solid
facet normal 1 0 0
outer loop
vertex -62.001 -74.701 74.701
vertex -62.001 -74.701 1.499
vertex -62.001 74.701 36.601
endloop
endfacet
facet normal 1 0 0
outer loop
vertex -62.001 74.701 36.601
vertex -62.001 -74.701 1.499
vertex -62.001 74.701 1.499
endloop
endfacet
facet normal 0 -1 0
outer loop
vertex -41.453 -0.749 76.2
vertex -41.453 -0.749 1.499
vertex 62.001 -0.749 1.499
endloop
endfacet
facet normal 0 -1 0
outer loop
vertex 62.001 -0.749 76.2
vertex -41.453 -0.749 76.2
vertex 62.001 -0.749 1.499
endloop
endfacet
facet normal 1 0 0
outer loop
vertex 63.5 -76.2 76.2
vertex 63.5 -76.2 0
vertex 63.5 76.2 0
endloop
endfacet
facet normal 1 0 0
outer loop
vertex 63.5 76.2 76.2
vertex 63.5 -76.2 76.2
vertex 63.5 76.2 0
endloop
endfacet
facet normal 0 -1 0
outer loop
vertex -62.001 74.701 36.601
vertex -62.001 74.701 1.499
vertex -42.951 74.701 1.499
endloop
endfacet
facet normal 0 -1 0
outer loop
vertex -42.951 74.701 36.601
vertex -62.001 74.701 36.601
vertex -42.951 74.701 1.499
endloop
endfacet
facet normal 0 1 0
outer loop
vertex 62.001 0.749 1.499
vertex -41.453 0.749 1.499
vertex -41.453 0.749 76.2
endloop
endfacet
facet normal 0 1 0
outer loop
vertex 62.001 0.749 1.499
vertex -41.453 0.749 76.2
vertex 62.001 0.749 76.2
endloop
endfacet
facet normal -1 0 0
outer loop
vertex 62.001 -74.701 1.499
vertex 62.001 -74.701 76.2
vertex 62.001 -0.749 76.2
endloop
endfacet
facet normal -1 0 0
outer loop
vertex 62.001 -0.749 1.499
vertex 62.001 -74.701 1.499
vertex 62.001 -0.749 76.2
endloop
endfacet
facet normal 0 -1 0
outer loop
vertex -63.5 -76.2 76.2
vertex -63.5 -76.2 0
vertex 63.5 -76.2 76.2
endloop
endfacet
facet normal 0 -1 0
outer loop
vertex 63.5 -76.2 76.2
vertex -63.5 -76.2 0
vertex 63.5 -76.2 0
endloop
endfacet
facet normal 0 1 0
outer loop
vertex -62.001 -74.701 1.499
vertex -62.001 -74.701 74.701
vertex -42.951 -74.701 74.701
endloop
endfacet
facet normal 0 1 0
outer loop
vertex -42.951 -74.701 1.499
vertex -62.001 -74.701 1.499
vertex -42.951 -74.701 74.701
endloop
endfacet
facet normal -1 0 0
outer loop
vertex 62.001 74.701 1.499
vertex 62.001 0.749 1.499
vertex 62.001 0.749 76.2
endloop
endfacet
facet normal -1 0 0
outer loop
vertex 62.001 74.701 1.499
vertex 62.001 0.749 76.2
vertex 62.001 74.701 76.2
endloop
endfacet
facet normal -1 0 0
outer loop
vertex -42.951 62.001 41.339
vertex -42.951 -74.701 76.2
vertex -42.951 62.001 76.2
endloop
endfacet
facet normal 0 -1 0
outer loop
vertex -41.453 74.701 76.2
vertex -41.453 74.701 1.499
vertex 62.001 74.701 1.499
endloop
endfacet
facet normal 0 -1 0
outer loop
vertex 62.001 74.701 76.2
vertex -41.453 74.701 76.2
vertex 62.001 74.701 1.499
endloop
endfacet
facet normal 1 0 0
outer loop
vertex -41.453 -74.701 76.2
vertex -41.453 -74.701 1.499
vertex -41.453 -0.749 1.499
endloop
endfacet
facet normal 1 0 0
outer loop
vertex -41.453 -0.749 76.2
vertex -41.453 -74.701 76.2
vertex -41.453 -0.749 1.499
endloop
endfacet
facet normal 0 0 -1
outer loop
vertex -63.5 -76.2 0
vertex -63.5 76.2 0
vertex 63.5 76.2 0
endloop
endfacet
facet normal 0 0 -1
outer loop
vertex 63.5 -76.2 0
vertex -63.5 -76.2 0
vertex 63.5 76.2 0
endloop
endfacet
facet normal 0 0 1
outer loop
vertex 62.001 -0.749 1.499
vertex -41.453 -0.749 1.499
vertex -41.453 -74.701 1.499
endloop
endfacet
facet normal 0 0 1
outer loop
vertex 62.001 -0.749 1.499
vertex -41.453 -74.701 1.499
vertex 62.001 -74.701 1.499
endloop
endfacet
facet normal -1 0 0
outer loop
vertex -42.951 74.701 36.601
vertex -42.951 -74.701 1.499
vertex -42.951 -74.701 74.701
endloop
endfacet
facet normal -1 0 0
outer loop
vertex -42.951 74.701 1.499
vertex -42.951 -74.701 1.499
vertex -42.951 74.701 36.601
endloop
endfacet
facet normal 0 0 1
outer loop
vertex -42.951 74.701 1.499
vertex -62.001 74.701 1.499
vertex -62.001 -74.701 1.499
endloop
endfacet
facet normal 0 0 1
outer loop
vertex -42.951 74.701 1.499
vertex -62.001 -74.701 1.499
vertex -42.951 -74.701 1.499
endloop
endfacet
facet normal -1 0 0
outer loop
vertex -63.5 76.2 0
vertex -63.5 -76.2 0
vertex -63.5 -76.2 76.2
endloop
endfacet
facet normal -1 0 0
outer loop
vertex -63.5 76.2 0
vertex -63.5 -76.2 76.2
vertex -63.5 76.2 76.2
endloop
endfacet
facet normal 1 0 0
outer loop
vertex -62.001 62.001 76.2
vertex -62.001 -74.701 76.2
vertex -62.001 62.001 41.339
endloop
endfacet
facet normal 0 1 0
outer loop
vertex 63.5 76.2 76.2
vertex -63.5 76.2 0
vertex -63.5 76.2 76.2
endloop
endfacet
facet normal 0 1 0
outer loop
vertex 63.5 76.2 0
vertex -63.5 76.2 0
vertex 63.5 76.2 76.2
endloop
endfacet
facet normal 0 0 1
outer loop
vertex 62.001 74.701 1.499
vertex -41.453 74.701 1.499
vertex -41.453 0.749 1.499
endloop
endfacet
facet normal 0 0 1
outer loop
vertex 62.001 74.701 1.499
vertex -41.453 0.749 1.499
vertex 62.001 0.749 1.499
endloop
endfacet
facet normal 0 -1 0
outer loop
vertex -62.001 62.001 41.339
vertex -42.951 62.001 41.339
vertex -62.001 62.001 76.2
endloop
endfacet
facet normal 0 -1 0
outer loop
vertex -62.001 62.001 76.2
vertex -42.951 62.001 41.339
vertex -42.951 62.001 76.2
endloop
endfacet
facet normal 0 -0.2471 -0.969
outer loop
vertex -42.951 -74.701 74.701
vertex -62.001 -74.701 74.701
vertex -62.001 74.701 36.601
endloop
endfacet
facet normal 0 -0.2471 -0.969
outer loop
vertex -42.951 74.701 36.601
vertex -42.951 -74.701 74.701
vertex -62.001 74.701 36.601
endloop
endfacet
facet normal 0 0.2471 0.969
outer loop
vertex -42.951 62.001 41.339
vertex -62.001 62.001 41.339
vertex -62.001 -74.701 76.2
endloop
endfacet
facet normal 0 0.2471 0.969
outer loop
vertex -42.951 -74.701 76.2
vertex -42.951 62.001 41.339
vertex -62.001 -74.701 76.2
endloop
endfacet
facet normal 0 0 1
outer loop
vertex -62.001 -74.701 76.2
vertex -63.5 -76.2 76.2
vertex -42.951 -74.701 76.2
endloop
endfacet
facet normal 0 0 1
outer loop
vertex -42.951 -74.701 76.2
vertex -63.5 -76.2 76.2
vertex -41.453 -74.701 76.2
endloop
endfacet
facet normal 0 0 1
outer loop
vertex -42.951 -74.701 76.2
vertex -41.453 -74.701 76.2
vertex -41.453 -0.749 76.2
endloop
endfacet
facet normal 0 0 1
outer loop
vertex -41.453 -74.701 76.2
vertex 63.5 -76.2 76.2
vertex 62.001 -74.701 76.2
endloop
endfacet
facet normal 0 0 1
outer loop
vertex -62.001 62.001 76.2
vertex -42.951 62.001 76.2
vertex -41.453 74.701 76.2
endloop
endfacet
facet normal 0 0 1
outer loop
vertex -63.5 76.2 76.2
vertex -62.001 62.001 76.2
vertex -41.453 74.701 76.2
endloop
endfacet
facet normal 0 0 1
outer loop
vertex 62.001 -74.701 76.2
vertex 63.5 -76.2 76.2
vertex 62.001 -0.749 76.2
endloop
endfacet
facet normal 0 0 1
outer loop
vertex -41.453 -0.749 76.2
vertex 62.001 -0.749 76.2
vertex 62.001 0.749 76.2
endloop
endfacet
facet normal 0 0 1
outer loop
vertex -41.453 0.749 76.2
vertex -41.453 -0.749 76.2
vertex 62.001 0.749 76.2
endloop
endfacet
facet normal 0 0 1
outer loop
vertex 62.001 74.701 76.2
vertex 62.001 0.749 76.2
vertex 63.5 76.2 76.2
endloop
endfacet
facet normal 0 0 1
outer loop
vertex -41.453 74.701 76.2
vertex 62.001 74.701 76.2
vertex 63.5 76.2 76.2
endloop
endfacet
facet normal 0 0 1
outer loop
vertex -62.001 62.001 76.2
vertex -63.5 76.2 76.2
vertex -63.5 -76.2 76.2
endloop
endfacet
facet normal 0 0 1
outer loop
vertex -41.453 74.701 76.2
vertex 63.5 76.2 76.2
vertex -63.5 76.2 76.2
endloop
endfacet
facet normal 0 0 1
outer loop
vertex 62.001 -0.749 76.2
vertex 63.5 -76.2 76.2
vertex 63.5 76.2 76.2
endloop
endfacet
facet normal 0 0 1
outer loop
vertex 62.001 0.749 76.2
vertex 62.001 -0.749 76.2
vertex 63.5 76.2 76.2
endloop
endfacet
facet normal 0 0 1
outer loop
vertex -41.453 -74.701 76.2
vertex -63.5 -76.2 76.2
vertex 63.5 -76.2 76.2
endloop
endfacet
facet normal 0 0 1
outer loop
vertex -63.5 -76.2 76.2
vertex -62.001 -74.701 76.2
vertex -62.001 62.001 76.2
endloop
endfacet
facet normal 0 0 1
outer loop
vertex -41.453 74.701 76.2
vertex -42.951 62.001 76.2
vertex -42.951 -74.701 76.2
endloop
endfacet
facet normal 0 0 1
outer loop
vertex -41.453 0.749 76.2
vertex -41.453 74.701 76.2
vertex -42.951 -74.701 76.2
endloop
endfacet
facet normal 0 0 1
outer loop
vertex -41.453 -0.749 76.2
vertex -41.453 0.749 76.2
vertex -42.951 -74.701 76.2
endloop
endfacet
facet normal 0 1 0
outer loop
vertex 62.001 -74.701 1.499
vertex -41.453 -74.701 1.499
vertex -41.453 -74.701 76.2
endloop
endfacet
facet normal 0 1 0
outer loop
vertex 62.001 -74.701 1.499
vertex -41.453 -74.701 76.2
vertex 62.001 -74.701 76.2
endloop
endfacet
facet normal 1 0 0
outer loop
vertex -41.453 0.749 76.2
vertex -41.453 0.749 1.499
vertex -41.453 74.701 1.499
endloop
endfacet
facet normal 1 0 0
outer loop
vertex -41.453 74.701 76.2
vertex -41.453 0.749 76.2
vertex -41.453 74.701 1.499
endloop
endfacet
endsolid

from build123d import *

# Parameters (mm, degrees)
F0_W      = 127
F0_H      = 152.4
F1_DEPTH  = 76.2
F2_T      = -1.4986
F3_W      = 1.4986
F3_H      = 149.4028
F5_DEPTH  = 74.7014
F6_DEPTH  = 19.05
F8_DEPTH  = 19.05
F9_W      = 103.4542
F9_H      = 1.4986
F10_DEPTH = 74.7014


# Not quite as in the source:
# - an extrude ends at something that could not be found from the text; its depth is read off the source's solid


with BuildPart() as f1:
    # F0 (on Top) → F1 (new body)
    with BuildSketch(Plane.XY):
        Rectangle(F0_W, F0_H)
    extrude(amount=F1_DEPTH)

    # F2
    f2_openings = [f1.faces().sort_by_distance(p)[0] for p in [
        (0, 0, 76.2),
    ]]
    offset(amount=F2_T, openings=f2_openings)

    # F3 (on face) → F5 (join, through all)
    with BuildSketch(Plane.XY.offset(1.4986)):
        with Locations((-42.2021, 0)):
            Rectangle(F3_W, F3_H)
    extrude(amount=F5_DEPTH)

    # F4 (on face) → F6 (join, through all)
    with BuildSketch(Plane.YZ.offset(-62.0014)):
        Polygon((-74.7014, 74.7014), (74.7014, 36.6014), (74.7014, 38.1), (-74.7014, 76.2), align=None)
    extrude(amount=F6_DEPTH)

    # F7 (on face) → F8 (join, through all)
    with BuildSketch(Plane(origin=(-42.9514, 0, 0), x_dir=(0, -1, 0), z_dir=(-1, 0, 0))):
        Polygon((-74.7014, 76.2), (-74.7014, 38.1), (-62.0014, 41.3386943217), (-62.0014, 76.2), align=None)
    extrude(amount=F8_DEPTH)

    # F9 (on face) → F10 (join, through all)
    with BuildSketch(Plane.XY.offset(1.4986)):
        with Locations((10.2743, 0)):
            Rectangle(F9_W, F9_H)
    extrude(amount=F10_DEPTH)


solid = f1.part
